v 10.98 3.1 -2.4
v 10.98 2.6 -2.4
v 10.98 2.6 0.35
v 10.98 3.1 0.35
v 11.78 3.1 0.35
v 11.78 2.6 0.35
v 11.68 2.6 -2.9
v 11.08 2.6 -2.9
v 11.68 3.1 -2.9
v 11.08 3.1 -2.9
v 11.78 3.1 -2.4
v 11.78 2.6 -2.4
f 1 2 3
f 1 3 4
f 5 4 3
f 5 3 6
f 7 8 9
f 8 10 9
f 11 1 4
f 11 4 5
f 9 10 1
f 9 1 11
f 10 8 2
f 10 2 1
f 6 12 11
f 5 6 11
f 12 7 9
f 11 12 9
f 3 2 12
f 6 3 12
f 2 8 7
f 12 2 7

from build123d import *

# Parameters (mm, degrees)
BOX011_W           = 0.8
BOX011_H           = 0.5
BOX011_DEPTH       = 3.25
CHAMFER002_1_SIZE2 = 0.1
CHAMFER002_1_SIZE  = 0.5
CHAMFER002_2_SIZE2 = 0.1
CHAMFER002_2_SIZE  = 0.5


with BuildPart() as part:
    # Box011 → Box011 (new body)
    with BuildSketch(Plane(origin=(10.98, 2.6, -2.9), x_dir=(1, 0, 0), z_dir=(0, 0, 1))):
        with Locations((0.4, 0.25)):
            Rectangle(BOX011_W, BOX011_H)
    extrude(amount=BOX011_DEPTH)

    # Chamfer002 1
    chamfer002_1_edges = [part.edges().sort_by_distance(p)[0] for p in [
        (11.78, 2.85, -2.9),
    ]]
    chamfer002_1_side = part.faces().sort_by_distance((11.78, 2.85, -1.275))[0]
    chamfer(chamfer002_1_edges, length=CHAMFER002_1_SIZE, length2=CHAMFER002_1_SIZE2, reference=chamfer002_1_side)

    # Chamfer002 2
    chamfer002_2_edges = [part.edges().sort_by_distance(p)[0] for p in [
        (10.98, 2.85, -2.9),
    ]]
    chamfer002_2_side = part.faces().sort_by_distance((10.98, 2.85, -1.275))[0]
    chamfer(chamfer002_2_edges, length=CHAMFER002_2_SIZE, length2=CHAMFER002_2_SIZE2, reference=chamfer002_2_side)


solid = part.part
